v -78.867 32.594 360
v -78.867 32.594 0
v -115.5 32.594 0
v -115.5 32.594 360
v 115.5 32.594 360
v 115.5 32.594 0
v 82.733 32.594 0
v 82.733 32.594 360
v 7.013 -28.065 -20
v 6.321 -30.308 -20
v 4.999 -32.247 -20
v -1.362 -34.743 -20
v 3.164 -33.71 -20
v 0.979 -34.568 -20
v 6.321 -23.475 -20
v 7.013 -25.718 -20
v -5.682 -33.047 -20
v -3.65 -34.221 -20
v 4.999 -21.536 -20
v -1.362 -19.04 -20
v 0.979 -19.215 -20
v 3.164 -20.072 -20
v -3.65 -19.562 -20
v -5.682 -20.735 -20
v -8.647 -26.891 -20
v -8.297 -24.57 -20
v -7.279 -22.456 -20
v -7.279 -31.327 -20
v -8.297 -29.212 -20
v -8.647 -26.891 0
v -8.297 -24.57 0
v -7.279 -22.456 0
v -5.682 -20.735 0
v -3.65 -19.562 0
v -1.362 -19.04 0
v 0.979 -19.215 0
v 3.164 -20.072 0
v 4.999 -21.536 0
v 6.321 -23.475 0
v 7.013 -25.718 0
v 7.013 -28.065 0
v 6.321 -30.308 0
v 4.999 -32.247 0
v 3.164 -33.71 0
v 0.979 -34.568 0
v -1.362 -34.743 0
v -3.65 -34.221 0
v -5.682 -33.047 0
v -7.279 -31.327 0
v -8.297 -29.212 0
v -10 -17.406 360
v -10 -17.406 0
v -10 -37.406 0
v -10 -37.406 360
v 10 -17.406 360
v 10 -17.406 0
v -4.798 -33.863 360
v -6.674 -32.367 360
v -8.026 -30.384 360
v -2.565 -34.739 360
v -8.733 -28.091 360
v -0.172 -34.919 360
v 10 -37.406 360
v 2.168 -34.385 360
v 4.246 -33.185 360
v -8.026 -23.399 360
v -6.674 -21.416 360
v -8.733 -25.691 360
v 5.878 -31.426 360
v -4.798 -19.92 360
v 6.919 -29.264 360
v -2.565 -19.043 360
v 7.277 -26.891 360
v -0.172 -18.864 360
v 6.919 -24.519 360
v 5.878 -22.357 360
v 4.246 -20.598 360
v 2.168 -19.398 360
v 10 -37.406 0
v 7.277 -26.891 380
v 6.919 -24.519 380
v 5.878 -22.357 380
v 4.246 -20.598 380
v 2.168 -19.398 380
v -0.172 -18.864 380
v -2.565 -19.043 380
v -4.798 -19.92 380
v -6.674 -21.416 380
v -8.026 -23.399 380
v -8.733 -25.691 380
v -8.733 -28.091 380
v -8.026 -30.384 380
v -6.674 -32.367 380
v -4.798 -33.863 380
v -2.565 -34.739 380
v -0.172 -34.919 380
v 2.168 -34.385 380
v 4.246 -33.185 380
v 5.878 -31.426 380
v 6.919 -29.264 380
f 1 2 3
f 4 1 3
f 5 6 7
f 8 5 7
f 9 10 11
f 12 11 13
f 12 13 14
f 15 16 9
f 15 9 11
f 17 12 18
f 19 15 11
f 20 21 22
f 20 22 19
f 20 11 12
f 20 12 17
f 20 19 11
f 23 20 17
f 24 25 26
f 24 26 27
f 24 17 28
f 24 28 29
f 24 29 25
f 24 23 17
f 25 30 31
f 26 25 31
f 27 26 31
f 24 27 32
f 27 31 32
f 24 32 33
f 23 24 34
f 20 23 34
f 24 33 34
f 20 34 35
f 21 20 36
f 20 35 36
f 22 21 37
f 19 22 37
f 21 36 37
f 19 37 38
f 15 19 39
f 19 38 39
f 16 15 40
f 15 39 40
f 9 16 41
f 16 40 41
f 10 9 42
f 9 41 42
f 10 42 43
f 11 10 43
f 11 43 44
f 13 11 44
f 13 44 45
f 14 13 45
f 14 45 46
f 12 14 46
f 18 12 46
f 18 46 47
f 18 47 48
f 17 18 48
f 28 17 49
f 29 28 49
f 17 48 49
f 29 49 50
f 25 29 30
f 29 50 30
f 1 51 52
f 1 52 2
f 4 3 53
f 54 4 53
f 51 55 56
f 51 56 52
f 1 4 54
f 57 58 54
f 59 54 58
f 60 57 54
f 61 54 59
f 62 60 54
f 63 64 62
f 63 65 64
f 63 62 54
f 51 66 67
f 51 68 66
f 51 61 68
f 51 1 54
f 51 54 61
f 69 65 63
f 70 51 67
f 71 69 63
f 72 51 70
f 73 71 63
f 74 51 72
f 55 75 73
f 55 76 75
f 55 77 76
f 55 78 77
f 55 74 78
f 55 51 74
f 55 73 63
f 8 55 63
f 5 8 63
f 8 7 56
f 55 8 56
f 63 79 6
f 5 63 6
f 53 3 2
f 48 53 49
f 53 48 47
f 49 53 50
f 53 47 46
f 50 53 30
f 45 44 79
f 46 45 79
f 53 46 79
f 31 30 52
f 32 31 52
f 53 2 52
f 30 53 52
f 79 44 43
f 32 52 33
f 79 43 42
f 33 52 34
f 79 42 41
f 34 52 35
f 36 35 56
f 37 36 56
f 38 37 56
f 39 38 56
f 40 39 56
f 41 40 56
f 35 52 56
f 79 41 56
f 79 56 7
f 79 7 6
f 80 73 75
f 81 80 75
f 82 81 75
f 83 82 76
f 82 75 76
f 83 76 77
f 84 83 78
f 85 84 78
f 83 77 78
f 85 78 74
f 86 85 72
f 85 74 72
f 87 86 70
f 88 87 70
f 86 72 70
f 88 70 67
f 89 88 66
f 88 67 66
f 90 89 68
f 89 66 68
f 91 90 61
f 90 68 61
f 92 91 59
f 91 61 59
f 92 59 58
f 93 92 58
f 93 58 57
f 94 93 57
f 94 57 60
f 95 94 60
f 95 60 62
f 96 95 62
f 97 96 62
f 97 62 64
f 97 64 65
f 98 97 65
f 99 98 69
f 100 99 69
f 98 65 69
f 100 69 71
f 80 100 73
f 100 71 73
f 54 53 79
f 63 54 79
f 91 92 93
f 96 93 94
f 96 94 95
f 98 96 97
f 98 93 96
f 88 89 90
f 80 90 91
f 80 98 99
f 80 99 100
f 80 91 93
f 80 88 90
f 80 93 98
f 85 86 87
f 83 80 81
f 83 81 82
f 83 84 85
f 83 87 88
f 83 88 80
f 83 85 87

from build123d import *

# Parameters (mm, degrees)
BOSS_EXTRUDE1_DEPTH = 360
CUT_EXTRUDE1_DEPTH  = 360
SKETCH3_R           = 8.05
BOSS_EXTRUDE2_DEPTH = 20
SKETCH4_R           = 7.873776935
BOSS_EXTRUDE3_DEPTH = 20


with BuildPart() as part:
    # Sketch1 → Boss-Extrude1 (new body)
    with BuildSketch(Plane.XY):
        Polygon((-115.5, 32.593599034), (-10, -37.406400966), (10, -37.406400966), (115.5, 32.593599034), align=None)
    extrude(amount=BOSS_EXTRUDE1_DEPTH)

    # Sketch2 → Cut-Extrude1 (cut)
    with BuildSketch(Plane.XY.offset(360)):
        Polygon((-78.867089656, 32.593599034), (82.733123463, 32.593599034), (10, -17.406400966), (-10, -17.406400966), align=None)
    extrude(amount=-CUT_EXTRUDE1_DEPTH, mode=Mode.SUBTRACT)

    # Sketch3 → Boss-Extrude2 (add)
    with BuildSketch(Plane.XY.offset(360)):
        with Locations((-0.773206761, -26.891281742)):
            Circle(SKETCH3_R)
    extrude(amount=BOSS_EXTRUDE2_DEPTH)

    # Sketch4 → Boss-Extrude3 (add)
    with BuildSketch(Plane(origin=(0, 0, 0), x_dir=(-1, 0, 0), z_dir=(0, 0, -1))):
        with Locations((0.773206761, -26.891281742)):
            Circle(SKETCH4_R)
    extrude(amount=BOSS_EXTRUDE3_DEPTH)


solid = part.part
